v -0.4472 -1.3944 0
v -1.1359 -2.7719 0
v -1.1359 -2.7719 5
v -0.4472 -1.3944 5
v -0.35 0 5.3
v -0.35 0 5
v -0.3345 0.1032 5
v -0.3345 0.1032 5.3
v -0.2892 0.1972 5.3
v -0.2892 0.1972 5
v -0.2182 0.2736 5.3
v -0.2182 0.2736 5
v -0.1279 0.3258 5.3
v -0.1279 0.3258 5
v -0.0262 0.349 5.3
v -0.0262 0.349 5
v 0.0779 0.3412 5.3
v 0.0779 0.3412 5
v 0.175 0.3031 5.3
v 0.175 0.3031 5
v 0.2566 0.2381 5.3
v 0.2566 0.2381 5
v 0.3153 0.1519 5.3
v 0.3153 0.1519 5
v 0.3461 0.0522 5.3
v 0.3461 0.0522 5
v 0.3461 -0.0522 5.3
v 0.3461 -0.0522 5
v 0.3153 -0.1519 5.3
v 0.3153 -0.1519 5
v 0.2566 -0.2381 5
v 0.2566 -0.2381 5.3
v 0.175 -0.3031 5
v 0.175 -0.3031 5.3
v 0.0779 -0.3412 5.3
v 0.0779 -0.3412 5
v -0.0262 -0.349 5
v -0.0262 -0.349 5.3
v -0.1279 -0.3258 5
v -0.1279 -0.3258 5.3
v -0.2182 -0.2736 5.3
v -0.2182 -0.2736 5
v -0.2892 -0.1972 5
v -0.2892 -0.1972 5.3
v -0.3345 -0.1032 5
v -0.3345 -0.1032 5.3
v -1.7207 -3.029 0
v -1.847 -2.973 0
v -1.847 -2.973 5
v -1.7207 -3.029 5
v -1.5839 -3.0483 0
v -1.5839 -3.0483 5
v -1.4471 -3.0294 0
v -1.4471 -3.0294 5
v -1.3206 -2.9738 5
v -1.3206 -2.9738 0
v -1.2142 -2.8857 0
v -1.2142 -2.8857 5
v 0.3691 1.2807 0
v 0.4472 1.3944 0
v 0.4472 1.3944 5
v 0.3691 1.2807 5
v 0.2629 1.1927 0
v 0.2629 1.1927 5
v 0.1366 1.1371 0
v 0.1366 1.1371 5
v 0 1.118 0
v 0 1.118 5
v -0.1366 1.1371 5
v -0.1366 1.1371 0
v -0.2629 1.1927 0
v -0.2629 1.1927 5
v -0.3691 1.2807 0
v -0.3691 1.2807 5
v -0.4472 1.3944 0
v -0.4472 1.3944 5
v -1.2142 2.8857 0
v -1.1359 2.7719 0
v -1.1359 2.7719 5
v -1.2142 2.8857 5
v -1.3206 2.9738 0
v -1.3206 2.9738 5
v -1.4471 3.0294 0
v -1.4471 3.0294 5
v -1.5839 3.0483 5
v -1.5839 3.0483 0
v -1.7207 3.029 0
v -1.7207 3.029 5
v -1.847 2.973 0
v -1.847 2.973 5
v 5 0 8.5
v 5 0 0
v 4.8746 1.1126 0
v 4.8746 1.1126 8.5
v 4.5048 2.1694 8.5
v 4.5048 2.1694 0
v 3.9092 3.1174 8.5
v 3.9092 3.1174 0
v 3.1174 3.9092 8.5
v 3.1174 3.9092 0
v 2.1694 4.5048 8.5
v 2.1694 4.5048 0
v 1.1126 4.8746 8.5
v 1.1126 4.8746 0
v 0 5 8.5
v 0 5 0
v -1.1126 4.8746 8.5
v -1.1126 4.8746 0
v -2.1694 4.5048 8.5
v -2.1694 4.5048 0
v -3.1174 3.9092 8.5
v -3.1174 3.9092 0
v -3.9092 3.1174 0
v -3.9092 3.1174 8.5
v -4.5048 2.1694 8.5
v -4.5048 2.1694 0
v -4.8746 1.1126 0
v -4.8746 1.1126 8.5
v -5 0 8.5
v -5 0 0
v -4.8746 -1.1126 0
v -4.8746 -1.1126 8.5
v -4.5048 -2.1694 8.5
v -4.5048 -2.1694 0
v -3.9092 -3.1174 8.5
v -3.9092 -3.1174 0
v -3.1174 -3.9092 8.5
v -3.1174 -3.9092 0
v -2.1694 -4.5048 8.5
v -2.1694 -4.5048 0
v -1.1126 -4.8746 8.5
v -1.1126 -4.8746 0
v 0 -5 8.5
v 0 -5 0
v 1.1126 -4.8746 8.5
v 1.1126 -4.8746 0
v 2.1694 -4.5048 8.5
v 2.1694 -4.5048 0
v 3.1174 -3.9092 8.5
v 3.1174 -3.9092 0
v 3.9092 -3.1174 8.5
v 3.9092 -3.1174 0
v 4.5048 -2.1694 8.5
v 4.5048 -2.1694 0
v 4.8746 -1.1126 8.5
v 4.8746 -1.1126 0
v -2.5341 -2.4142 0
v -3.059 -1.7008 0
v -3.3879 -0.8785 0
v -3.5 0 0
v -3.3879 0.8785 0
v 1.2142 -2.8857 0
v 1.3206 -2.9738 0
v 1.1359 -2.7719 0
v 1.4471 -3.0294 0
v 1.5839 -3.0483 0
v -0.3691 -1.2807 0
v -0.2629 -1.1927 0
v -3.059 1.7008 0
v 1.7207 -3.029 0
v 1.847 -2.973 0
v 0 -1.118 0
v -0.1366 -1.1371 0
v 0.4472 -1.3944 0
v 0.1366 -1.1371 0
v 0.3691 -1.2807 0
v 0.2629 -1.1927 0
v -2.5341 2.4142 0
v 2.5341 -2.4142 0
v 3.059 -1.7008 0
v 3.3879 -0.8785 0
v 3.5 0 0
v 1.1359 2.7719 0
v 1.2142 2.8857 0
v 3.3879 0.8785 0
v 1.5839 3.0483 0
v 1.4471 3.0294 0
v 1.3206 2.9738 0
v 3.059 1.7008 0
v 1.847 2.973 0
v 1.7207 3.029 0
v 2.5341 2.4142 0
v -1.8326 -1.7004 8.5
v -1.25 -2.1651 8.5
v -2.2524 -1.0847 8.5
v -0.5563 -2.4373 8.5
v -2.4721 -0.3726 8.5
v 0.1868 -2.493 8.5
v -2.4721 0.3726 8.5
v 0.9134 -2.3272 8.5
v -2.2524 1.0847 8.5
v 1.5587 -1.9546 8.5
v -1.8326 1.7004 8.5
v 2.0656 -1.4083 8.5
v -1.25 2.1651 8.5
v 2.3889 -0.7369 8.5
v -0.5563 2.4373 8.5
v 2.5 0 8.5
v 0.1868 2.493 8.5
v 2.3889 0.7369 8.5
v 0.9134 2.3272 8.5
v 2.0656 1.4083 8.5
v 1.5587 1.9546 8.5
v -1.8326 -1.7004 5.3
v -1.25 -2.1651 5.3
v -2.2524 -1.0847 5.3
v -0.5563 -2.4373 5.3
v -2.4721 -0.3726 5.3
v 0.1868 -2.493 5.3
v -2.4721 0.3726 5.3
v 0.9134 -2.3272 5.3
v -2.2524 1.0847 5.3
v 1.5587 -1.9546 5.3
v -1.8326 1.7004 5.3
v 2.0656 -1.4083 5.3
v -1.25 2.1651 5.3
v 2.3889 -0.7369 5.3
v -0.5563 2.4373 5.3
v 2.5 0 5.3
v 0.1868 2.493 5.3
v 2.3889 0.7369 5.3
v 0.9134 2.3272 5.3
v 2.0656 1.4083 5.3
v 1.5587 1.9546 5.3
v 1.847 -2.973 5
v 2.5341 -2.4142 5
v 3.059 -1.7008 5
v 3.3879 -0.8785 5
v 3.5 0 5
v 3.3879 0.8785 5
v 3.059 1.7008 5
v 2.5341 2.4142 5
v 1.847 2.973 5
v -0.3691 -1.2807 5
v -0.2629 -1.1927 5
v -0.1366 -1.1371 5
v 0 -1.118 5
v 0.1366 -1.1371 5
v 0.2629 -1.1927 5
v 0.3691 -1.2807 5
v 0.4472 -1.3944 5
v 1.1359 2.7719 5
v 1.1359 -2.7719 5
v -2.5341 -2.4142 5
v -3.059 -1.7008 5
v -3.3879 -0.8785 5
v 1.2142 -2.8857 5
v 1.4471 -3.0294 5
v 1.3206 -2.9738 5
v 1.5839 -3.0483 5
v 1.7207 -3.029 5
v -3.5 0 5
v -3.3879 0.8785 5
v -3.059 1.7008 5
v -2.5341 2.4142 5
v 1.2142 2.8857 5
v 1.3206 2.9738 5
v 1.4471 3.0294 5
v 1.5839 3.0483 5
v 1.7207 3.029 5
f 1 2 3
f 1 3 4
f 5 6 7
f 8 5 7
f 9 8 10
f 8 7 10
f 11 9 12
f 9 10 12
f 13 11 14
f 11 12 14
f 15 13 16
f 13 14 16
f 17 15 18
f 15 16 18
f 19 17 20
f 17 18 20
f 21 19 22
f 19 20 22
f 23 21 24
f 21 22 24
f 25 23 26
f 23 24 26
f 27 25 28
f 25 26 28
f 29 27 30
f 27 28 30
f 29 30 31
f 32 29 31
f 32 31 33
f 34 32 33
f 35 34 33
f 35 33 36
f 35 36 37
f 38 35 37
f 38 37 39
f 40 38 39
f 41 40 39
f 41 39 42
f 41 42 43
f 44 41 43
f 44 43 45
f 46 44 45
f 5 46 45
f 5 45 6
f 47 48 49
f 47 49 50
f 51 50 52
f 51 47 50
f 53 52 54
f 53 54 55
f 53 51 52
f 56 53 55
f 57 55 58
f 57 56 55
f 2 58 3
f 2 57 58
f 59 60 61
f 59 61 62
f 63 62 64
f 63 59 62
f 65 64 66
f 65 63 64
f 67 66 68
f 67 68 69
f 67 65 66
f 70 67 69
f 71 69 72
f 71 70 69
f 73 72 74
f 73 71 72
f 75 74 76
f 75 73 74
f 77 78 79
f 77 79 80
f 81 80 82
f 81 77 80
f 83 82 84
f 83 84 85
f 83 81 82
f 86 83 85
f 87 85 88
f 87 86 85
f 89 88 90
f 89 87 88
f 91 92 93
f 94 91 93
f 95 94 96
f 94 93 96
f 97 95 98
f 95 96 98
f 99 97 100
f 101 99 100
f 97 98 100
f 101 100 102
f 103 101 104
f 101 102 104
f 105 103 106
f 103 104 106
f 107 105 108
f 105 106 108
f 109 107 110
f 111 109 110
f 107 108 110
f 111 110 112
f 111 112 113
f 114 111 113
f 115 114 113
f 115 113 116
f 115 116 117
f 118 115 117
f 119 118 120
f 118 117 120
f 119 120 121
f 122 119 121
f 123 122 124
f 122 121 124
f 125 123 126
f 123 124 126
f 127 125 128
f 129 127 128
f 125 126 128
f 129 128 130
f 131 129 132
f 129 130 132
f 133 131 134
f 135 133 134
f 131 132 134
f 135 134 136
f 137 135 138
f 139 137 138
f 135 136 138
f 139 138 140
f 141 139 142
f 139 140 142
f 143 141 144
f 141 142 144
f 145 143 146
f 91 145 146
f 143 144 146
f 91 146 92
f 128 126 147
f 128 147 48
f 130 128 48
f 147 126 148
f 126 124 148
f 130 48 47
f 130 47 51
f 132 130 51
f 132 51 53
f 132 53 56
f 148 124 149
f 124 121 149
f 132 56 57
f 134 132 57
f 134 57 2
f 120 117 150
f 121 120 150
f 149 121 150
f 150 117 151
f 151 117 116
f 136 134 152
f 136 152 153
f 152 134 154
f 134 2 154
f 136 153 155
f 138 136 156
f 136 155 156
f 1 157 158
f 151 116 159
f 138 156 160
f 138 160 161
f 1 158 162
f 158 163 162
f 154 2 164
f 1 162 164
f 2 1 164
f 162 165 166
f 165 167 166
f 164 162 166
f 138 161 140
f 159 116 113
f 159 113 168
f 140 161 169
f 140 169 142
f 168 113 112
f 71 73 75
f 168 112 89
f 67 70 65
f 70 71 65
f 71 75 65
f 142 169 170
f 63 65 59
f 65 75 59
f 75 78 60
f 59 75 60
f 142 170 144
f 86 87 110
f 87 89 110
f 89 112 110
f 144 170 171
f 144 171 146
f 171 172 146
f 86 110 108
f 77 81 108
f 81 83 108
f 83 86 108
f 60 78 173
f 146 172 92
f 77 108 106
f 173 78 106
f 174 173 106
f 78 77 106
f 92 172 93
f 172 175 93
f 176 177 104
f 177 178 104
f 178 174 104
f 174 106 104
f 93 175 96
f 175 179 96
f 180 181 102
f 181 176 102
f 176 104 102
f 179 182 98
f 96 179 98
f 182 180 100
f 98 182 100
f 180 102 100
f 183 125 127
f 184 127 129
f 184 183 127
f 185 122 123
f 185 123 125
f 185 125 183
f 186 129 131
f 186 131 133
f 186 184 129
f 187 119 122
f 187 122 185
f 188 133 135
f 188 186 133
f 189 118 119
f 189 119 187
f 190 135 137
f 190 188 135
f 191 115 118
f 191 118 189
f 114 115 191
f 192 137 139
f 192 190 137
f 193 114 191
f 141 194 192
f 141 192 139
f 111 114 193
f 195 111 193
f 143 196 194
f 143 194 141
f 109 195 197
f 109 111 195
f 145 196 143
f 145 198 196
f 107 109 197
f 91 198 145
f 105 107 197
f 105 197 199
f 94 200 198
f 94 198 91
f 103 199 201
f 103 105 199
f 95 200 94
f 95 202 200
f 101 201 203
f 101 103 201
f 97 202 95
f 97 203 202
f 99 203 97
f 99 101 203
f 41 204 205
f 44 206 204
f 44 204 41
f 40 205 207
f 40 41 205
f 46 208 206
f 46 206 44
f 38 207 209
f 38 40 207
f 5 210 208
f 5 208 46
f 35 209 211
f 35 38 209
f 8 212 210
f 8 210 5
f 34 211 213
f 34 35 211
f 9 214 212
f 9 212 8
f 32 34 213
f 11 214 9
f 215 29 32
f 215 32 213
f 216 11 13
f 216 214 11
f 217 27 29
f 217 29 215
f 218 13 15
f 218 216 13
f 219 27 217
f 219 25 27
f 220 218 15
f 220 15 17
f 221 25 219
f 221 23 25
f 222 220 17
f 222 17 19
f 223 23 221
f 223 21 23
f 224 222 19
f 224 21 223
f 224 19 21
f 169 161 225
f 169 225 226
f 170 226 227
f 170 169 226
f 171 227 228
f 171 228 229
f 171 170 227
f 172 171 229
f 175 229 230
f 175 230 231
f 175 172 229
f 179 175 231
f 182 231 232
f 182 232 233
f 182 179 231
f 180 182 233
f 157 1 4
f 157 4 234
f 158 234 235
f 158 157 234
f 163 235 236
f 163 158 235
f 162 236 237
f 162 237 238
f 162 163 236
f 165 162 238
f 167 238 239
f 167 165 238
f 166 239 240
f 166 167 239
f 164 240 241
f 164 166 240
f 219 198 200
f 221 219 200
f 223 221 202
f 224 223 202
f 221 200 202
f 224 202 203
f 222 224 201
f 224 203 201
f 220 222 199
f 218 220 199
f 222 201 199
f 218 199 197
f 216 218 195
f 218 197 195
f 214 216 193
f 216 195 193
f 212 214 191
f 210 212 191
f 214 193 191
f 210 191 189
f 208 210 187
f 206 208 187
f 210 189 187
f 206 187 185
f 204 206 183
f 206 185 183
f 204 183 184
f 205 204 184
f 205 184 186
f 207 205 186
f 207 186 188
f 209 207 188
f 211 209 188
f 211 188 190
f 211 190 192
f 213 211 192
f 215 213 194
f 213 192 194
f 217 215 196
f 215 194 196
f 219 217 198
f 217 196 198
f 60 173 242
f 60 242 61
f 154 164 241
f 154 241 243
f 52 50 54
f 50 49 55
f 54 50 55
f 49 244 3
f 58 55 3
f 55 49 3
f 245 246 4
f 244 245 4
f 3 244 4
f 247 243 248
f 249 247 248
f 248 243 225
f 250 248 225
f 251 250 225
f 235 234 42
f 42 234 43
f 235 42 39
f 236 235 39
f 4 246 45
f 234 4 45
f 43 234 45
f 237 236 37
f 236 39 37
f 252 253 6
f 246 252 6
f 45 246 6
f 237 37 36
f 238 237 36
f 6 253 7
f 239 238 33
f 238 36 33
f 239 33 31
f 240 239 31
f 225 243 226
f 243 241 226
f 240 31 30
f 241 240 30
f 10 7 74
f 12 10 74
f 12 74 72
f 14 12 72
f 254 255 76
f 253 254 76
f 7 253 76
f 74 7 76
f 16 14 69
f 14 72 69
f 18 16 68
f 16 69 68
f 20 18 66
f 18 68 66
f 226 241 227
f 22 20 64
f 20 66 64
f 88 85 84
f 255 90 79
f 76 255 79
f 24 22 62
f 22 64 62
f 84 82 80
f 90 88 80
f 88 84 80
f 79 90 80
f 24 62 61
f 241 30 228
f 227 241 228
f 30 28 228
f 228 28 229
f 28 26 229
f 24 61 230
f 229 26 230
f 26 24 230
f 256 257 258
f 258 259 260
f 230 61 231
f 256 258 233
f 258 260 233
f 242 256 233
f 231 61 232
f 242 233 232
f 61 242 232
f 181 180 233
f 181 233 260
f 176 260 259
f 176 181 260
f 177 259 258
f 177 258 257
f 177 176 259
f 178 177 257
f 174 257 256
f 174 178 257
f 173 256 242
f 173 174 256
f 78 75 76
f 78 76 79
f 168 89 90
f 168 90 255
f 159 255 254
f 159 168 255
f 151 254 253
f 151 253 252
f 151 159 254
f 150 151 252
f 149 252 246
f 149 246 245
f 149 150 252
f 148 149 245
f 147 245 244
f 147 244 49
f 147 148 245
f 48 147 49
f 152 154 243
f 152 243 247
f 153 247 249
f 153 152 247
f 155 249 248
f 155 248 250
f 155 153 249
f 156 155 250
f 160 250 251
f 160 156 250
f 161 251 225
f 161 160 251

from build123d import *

# Parameters (mm, degrees)
SKETCH2_R           = 5
BOSS_EXTRUDE1_DEPTH = 8.5
CUT_EXTRUDE1_DEPTH  = 5
SKETCH3_R           = 2.5
CUT_EXTRUDE2_DEPTH  = 3.2
SKETCH5_R           = 0.35
CUT_EXTRUDE4_DEPTH  = 1


with BuildPart() as part:
    # Sketch2 → Boss-Extrude1 (new body)
    with BuildSketch(Plane.XY):
        Circle(SKETCH2_R)
    extrude(amount=BOSS_EXTRUDE1_DEPTH)

    # Sketch1 → Cut-Extrude1 (cut)
    with BuildSketch(Plane.XY):
        with BuildLine():
            Line((-0.447213595, 1.394427191), (-1.135934639, 2.771869278))
            ThreePointArc((-1.135934639, 2.771869278), (-1.447076632, 3.029390861), (-1.847006274, 2.972972894))
            ThreePointArc((-1.847006274, 2.972972894), (-3.5, 0), (-1.847006274, -2.972972894))
            ThreePointArc((-1.847006274, -2.972972894), (-1.447076632, -3.029390861), (-1.135934639, -2.771869278))
            Line((-1.135934639, -2.771869278), (-0.447213595, -1.394427191))
            ThreePointArc((-0.447213595, -1.394427191), (0, -1.118033989), (0.447213595, -1.394427191))
            Line((0.447213595, -1.394427191), (1.135934639, -2.771869278))
            ThreePointArc((1.135934639, -2.771869278), (1.447076632, -3.029390861), (1.847006274, -2.972972894))
            ThreePointArc((1.847006274, -2.972972894), (3.5, 0), (1.847006274, 2.972972894))
            ThreePointArc((1.847006274, 2.972972894), (1.447076632, 3.029390861), (1.135934639, 2.771869278))
            Line((1.135934639, 2.771869278), (0.447213595, 1.394427191))
            ThreePointArc((0.447213595, 1.394427191), (0, 1.118033989), (-0.447213595, 1.394427191))
        make_face()
    extrude(amount=CUT_EXTRUDE1_DEPTH, mode=Mode.SUBTRACT)

    # Sketch3 → Cut-Extrude2 (cut)
    with BuildSketch(Plane.XY.offset(8.5)):
        Circle(SKETCH3_R)
    extrude(amount=-CUT_EXTRUDE2_DEPTH, mode=Mode.SUBTRACT)

    # Sketch5 → Cut-Extrude4 (cut)
    with BuildSketch(Plane(origin=(0, 0, 5), x_dir=(-1, 0, 0), z_dir=(0, 0, -1))):
        Circle(SKETCH5_R)
    extrude(amount=-CUT_EXTRUDE4_DEPTH, mode=Mode.SUBTRACT)


solid = part.part
